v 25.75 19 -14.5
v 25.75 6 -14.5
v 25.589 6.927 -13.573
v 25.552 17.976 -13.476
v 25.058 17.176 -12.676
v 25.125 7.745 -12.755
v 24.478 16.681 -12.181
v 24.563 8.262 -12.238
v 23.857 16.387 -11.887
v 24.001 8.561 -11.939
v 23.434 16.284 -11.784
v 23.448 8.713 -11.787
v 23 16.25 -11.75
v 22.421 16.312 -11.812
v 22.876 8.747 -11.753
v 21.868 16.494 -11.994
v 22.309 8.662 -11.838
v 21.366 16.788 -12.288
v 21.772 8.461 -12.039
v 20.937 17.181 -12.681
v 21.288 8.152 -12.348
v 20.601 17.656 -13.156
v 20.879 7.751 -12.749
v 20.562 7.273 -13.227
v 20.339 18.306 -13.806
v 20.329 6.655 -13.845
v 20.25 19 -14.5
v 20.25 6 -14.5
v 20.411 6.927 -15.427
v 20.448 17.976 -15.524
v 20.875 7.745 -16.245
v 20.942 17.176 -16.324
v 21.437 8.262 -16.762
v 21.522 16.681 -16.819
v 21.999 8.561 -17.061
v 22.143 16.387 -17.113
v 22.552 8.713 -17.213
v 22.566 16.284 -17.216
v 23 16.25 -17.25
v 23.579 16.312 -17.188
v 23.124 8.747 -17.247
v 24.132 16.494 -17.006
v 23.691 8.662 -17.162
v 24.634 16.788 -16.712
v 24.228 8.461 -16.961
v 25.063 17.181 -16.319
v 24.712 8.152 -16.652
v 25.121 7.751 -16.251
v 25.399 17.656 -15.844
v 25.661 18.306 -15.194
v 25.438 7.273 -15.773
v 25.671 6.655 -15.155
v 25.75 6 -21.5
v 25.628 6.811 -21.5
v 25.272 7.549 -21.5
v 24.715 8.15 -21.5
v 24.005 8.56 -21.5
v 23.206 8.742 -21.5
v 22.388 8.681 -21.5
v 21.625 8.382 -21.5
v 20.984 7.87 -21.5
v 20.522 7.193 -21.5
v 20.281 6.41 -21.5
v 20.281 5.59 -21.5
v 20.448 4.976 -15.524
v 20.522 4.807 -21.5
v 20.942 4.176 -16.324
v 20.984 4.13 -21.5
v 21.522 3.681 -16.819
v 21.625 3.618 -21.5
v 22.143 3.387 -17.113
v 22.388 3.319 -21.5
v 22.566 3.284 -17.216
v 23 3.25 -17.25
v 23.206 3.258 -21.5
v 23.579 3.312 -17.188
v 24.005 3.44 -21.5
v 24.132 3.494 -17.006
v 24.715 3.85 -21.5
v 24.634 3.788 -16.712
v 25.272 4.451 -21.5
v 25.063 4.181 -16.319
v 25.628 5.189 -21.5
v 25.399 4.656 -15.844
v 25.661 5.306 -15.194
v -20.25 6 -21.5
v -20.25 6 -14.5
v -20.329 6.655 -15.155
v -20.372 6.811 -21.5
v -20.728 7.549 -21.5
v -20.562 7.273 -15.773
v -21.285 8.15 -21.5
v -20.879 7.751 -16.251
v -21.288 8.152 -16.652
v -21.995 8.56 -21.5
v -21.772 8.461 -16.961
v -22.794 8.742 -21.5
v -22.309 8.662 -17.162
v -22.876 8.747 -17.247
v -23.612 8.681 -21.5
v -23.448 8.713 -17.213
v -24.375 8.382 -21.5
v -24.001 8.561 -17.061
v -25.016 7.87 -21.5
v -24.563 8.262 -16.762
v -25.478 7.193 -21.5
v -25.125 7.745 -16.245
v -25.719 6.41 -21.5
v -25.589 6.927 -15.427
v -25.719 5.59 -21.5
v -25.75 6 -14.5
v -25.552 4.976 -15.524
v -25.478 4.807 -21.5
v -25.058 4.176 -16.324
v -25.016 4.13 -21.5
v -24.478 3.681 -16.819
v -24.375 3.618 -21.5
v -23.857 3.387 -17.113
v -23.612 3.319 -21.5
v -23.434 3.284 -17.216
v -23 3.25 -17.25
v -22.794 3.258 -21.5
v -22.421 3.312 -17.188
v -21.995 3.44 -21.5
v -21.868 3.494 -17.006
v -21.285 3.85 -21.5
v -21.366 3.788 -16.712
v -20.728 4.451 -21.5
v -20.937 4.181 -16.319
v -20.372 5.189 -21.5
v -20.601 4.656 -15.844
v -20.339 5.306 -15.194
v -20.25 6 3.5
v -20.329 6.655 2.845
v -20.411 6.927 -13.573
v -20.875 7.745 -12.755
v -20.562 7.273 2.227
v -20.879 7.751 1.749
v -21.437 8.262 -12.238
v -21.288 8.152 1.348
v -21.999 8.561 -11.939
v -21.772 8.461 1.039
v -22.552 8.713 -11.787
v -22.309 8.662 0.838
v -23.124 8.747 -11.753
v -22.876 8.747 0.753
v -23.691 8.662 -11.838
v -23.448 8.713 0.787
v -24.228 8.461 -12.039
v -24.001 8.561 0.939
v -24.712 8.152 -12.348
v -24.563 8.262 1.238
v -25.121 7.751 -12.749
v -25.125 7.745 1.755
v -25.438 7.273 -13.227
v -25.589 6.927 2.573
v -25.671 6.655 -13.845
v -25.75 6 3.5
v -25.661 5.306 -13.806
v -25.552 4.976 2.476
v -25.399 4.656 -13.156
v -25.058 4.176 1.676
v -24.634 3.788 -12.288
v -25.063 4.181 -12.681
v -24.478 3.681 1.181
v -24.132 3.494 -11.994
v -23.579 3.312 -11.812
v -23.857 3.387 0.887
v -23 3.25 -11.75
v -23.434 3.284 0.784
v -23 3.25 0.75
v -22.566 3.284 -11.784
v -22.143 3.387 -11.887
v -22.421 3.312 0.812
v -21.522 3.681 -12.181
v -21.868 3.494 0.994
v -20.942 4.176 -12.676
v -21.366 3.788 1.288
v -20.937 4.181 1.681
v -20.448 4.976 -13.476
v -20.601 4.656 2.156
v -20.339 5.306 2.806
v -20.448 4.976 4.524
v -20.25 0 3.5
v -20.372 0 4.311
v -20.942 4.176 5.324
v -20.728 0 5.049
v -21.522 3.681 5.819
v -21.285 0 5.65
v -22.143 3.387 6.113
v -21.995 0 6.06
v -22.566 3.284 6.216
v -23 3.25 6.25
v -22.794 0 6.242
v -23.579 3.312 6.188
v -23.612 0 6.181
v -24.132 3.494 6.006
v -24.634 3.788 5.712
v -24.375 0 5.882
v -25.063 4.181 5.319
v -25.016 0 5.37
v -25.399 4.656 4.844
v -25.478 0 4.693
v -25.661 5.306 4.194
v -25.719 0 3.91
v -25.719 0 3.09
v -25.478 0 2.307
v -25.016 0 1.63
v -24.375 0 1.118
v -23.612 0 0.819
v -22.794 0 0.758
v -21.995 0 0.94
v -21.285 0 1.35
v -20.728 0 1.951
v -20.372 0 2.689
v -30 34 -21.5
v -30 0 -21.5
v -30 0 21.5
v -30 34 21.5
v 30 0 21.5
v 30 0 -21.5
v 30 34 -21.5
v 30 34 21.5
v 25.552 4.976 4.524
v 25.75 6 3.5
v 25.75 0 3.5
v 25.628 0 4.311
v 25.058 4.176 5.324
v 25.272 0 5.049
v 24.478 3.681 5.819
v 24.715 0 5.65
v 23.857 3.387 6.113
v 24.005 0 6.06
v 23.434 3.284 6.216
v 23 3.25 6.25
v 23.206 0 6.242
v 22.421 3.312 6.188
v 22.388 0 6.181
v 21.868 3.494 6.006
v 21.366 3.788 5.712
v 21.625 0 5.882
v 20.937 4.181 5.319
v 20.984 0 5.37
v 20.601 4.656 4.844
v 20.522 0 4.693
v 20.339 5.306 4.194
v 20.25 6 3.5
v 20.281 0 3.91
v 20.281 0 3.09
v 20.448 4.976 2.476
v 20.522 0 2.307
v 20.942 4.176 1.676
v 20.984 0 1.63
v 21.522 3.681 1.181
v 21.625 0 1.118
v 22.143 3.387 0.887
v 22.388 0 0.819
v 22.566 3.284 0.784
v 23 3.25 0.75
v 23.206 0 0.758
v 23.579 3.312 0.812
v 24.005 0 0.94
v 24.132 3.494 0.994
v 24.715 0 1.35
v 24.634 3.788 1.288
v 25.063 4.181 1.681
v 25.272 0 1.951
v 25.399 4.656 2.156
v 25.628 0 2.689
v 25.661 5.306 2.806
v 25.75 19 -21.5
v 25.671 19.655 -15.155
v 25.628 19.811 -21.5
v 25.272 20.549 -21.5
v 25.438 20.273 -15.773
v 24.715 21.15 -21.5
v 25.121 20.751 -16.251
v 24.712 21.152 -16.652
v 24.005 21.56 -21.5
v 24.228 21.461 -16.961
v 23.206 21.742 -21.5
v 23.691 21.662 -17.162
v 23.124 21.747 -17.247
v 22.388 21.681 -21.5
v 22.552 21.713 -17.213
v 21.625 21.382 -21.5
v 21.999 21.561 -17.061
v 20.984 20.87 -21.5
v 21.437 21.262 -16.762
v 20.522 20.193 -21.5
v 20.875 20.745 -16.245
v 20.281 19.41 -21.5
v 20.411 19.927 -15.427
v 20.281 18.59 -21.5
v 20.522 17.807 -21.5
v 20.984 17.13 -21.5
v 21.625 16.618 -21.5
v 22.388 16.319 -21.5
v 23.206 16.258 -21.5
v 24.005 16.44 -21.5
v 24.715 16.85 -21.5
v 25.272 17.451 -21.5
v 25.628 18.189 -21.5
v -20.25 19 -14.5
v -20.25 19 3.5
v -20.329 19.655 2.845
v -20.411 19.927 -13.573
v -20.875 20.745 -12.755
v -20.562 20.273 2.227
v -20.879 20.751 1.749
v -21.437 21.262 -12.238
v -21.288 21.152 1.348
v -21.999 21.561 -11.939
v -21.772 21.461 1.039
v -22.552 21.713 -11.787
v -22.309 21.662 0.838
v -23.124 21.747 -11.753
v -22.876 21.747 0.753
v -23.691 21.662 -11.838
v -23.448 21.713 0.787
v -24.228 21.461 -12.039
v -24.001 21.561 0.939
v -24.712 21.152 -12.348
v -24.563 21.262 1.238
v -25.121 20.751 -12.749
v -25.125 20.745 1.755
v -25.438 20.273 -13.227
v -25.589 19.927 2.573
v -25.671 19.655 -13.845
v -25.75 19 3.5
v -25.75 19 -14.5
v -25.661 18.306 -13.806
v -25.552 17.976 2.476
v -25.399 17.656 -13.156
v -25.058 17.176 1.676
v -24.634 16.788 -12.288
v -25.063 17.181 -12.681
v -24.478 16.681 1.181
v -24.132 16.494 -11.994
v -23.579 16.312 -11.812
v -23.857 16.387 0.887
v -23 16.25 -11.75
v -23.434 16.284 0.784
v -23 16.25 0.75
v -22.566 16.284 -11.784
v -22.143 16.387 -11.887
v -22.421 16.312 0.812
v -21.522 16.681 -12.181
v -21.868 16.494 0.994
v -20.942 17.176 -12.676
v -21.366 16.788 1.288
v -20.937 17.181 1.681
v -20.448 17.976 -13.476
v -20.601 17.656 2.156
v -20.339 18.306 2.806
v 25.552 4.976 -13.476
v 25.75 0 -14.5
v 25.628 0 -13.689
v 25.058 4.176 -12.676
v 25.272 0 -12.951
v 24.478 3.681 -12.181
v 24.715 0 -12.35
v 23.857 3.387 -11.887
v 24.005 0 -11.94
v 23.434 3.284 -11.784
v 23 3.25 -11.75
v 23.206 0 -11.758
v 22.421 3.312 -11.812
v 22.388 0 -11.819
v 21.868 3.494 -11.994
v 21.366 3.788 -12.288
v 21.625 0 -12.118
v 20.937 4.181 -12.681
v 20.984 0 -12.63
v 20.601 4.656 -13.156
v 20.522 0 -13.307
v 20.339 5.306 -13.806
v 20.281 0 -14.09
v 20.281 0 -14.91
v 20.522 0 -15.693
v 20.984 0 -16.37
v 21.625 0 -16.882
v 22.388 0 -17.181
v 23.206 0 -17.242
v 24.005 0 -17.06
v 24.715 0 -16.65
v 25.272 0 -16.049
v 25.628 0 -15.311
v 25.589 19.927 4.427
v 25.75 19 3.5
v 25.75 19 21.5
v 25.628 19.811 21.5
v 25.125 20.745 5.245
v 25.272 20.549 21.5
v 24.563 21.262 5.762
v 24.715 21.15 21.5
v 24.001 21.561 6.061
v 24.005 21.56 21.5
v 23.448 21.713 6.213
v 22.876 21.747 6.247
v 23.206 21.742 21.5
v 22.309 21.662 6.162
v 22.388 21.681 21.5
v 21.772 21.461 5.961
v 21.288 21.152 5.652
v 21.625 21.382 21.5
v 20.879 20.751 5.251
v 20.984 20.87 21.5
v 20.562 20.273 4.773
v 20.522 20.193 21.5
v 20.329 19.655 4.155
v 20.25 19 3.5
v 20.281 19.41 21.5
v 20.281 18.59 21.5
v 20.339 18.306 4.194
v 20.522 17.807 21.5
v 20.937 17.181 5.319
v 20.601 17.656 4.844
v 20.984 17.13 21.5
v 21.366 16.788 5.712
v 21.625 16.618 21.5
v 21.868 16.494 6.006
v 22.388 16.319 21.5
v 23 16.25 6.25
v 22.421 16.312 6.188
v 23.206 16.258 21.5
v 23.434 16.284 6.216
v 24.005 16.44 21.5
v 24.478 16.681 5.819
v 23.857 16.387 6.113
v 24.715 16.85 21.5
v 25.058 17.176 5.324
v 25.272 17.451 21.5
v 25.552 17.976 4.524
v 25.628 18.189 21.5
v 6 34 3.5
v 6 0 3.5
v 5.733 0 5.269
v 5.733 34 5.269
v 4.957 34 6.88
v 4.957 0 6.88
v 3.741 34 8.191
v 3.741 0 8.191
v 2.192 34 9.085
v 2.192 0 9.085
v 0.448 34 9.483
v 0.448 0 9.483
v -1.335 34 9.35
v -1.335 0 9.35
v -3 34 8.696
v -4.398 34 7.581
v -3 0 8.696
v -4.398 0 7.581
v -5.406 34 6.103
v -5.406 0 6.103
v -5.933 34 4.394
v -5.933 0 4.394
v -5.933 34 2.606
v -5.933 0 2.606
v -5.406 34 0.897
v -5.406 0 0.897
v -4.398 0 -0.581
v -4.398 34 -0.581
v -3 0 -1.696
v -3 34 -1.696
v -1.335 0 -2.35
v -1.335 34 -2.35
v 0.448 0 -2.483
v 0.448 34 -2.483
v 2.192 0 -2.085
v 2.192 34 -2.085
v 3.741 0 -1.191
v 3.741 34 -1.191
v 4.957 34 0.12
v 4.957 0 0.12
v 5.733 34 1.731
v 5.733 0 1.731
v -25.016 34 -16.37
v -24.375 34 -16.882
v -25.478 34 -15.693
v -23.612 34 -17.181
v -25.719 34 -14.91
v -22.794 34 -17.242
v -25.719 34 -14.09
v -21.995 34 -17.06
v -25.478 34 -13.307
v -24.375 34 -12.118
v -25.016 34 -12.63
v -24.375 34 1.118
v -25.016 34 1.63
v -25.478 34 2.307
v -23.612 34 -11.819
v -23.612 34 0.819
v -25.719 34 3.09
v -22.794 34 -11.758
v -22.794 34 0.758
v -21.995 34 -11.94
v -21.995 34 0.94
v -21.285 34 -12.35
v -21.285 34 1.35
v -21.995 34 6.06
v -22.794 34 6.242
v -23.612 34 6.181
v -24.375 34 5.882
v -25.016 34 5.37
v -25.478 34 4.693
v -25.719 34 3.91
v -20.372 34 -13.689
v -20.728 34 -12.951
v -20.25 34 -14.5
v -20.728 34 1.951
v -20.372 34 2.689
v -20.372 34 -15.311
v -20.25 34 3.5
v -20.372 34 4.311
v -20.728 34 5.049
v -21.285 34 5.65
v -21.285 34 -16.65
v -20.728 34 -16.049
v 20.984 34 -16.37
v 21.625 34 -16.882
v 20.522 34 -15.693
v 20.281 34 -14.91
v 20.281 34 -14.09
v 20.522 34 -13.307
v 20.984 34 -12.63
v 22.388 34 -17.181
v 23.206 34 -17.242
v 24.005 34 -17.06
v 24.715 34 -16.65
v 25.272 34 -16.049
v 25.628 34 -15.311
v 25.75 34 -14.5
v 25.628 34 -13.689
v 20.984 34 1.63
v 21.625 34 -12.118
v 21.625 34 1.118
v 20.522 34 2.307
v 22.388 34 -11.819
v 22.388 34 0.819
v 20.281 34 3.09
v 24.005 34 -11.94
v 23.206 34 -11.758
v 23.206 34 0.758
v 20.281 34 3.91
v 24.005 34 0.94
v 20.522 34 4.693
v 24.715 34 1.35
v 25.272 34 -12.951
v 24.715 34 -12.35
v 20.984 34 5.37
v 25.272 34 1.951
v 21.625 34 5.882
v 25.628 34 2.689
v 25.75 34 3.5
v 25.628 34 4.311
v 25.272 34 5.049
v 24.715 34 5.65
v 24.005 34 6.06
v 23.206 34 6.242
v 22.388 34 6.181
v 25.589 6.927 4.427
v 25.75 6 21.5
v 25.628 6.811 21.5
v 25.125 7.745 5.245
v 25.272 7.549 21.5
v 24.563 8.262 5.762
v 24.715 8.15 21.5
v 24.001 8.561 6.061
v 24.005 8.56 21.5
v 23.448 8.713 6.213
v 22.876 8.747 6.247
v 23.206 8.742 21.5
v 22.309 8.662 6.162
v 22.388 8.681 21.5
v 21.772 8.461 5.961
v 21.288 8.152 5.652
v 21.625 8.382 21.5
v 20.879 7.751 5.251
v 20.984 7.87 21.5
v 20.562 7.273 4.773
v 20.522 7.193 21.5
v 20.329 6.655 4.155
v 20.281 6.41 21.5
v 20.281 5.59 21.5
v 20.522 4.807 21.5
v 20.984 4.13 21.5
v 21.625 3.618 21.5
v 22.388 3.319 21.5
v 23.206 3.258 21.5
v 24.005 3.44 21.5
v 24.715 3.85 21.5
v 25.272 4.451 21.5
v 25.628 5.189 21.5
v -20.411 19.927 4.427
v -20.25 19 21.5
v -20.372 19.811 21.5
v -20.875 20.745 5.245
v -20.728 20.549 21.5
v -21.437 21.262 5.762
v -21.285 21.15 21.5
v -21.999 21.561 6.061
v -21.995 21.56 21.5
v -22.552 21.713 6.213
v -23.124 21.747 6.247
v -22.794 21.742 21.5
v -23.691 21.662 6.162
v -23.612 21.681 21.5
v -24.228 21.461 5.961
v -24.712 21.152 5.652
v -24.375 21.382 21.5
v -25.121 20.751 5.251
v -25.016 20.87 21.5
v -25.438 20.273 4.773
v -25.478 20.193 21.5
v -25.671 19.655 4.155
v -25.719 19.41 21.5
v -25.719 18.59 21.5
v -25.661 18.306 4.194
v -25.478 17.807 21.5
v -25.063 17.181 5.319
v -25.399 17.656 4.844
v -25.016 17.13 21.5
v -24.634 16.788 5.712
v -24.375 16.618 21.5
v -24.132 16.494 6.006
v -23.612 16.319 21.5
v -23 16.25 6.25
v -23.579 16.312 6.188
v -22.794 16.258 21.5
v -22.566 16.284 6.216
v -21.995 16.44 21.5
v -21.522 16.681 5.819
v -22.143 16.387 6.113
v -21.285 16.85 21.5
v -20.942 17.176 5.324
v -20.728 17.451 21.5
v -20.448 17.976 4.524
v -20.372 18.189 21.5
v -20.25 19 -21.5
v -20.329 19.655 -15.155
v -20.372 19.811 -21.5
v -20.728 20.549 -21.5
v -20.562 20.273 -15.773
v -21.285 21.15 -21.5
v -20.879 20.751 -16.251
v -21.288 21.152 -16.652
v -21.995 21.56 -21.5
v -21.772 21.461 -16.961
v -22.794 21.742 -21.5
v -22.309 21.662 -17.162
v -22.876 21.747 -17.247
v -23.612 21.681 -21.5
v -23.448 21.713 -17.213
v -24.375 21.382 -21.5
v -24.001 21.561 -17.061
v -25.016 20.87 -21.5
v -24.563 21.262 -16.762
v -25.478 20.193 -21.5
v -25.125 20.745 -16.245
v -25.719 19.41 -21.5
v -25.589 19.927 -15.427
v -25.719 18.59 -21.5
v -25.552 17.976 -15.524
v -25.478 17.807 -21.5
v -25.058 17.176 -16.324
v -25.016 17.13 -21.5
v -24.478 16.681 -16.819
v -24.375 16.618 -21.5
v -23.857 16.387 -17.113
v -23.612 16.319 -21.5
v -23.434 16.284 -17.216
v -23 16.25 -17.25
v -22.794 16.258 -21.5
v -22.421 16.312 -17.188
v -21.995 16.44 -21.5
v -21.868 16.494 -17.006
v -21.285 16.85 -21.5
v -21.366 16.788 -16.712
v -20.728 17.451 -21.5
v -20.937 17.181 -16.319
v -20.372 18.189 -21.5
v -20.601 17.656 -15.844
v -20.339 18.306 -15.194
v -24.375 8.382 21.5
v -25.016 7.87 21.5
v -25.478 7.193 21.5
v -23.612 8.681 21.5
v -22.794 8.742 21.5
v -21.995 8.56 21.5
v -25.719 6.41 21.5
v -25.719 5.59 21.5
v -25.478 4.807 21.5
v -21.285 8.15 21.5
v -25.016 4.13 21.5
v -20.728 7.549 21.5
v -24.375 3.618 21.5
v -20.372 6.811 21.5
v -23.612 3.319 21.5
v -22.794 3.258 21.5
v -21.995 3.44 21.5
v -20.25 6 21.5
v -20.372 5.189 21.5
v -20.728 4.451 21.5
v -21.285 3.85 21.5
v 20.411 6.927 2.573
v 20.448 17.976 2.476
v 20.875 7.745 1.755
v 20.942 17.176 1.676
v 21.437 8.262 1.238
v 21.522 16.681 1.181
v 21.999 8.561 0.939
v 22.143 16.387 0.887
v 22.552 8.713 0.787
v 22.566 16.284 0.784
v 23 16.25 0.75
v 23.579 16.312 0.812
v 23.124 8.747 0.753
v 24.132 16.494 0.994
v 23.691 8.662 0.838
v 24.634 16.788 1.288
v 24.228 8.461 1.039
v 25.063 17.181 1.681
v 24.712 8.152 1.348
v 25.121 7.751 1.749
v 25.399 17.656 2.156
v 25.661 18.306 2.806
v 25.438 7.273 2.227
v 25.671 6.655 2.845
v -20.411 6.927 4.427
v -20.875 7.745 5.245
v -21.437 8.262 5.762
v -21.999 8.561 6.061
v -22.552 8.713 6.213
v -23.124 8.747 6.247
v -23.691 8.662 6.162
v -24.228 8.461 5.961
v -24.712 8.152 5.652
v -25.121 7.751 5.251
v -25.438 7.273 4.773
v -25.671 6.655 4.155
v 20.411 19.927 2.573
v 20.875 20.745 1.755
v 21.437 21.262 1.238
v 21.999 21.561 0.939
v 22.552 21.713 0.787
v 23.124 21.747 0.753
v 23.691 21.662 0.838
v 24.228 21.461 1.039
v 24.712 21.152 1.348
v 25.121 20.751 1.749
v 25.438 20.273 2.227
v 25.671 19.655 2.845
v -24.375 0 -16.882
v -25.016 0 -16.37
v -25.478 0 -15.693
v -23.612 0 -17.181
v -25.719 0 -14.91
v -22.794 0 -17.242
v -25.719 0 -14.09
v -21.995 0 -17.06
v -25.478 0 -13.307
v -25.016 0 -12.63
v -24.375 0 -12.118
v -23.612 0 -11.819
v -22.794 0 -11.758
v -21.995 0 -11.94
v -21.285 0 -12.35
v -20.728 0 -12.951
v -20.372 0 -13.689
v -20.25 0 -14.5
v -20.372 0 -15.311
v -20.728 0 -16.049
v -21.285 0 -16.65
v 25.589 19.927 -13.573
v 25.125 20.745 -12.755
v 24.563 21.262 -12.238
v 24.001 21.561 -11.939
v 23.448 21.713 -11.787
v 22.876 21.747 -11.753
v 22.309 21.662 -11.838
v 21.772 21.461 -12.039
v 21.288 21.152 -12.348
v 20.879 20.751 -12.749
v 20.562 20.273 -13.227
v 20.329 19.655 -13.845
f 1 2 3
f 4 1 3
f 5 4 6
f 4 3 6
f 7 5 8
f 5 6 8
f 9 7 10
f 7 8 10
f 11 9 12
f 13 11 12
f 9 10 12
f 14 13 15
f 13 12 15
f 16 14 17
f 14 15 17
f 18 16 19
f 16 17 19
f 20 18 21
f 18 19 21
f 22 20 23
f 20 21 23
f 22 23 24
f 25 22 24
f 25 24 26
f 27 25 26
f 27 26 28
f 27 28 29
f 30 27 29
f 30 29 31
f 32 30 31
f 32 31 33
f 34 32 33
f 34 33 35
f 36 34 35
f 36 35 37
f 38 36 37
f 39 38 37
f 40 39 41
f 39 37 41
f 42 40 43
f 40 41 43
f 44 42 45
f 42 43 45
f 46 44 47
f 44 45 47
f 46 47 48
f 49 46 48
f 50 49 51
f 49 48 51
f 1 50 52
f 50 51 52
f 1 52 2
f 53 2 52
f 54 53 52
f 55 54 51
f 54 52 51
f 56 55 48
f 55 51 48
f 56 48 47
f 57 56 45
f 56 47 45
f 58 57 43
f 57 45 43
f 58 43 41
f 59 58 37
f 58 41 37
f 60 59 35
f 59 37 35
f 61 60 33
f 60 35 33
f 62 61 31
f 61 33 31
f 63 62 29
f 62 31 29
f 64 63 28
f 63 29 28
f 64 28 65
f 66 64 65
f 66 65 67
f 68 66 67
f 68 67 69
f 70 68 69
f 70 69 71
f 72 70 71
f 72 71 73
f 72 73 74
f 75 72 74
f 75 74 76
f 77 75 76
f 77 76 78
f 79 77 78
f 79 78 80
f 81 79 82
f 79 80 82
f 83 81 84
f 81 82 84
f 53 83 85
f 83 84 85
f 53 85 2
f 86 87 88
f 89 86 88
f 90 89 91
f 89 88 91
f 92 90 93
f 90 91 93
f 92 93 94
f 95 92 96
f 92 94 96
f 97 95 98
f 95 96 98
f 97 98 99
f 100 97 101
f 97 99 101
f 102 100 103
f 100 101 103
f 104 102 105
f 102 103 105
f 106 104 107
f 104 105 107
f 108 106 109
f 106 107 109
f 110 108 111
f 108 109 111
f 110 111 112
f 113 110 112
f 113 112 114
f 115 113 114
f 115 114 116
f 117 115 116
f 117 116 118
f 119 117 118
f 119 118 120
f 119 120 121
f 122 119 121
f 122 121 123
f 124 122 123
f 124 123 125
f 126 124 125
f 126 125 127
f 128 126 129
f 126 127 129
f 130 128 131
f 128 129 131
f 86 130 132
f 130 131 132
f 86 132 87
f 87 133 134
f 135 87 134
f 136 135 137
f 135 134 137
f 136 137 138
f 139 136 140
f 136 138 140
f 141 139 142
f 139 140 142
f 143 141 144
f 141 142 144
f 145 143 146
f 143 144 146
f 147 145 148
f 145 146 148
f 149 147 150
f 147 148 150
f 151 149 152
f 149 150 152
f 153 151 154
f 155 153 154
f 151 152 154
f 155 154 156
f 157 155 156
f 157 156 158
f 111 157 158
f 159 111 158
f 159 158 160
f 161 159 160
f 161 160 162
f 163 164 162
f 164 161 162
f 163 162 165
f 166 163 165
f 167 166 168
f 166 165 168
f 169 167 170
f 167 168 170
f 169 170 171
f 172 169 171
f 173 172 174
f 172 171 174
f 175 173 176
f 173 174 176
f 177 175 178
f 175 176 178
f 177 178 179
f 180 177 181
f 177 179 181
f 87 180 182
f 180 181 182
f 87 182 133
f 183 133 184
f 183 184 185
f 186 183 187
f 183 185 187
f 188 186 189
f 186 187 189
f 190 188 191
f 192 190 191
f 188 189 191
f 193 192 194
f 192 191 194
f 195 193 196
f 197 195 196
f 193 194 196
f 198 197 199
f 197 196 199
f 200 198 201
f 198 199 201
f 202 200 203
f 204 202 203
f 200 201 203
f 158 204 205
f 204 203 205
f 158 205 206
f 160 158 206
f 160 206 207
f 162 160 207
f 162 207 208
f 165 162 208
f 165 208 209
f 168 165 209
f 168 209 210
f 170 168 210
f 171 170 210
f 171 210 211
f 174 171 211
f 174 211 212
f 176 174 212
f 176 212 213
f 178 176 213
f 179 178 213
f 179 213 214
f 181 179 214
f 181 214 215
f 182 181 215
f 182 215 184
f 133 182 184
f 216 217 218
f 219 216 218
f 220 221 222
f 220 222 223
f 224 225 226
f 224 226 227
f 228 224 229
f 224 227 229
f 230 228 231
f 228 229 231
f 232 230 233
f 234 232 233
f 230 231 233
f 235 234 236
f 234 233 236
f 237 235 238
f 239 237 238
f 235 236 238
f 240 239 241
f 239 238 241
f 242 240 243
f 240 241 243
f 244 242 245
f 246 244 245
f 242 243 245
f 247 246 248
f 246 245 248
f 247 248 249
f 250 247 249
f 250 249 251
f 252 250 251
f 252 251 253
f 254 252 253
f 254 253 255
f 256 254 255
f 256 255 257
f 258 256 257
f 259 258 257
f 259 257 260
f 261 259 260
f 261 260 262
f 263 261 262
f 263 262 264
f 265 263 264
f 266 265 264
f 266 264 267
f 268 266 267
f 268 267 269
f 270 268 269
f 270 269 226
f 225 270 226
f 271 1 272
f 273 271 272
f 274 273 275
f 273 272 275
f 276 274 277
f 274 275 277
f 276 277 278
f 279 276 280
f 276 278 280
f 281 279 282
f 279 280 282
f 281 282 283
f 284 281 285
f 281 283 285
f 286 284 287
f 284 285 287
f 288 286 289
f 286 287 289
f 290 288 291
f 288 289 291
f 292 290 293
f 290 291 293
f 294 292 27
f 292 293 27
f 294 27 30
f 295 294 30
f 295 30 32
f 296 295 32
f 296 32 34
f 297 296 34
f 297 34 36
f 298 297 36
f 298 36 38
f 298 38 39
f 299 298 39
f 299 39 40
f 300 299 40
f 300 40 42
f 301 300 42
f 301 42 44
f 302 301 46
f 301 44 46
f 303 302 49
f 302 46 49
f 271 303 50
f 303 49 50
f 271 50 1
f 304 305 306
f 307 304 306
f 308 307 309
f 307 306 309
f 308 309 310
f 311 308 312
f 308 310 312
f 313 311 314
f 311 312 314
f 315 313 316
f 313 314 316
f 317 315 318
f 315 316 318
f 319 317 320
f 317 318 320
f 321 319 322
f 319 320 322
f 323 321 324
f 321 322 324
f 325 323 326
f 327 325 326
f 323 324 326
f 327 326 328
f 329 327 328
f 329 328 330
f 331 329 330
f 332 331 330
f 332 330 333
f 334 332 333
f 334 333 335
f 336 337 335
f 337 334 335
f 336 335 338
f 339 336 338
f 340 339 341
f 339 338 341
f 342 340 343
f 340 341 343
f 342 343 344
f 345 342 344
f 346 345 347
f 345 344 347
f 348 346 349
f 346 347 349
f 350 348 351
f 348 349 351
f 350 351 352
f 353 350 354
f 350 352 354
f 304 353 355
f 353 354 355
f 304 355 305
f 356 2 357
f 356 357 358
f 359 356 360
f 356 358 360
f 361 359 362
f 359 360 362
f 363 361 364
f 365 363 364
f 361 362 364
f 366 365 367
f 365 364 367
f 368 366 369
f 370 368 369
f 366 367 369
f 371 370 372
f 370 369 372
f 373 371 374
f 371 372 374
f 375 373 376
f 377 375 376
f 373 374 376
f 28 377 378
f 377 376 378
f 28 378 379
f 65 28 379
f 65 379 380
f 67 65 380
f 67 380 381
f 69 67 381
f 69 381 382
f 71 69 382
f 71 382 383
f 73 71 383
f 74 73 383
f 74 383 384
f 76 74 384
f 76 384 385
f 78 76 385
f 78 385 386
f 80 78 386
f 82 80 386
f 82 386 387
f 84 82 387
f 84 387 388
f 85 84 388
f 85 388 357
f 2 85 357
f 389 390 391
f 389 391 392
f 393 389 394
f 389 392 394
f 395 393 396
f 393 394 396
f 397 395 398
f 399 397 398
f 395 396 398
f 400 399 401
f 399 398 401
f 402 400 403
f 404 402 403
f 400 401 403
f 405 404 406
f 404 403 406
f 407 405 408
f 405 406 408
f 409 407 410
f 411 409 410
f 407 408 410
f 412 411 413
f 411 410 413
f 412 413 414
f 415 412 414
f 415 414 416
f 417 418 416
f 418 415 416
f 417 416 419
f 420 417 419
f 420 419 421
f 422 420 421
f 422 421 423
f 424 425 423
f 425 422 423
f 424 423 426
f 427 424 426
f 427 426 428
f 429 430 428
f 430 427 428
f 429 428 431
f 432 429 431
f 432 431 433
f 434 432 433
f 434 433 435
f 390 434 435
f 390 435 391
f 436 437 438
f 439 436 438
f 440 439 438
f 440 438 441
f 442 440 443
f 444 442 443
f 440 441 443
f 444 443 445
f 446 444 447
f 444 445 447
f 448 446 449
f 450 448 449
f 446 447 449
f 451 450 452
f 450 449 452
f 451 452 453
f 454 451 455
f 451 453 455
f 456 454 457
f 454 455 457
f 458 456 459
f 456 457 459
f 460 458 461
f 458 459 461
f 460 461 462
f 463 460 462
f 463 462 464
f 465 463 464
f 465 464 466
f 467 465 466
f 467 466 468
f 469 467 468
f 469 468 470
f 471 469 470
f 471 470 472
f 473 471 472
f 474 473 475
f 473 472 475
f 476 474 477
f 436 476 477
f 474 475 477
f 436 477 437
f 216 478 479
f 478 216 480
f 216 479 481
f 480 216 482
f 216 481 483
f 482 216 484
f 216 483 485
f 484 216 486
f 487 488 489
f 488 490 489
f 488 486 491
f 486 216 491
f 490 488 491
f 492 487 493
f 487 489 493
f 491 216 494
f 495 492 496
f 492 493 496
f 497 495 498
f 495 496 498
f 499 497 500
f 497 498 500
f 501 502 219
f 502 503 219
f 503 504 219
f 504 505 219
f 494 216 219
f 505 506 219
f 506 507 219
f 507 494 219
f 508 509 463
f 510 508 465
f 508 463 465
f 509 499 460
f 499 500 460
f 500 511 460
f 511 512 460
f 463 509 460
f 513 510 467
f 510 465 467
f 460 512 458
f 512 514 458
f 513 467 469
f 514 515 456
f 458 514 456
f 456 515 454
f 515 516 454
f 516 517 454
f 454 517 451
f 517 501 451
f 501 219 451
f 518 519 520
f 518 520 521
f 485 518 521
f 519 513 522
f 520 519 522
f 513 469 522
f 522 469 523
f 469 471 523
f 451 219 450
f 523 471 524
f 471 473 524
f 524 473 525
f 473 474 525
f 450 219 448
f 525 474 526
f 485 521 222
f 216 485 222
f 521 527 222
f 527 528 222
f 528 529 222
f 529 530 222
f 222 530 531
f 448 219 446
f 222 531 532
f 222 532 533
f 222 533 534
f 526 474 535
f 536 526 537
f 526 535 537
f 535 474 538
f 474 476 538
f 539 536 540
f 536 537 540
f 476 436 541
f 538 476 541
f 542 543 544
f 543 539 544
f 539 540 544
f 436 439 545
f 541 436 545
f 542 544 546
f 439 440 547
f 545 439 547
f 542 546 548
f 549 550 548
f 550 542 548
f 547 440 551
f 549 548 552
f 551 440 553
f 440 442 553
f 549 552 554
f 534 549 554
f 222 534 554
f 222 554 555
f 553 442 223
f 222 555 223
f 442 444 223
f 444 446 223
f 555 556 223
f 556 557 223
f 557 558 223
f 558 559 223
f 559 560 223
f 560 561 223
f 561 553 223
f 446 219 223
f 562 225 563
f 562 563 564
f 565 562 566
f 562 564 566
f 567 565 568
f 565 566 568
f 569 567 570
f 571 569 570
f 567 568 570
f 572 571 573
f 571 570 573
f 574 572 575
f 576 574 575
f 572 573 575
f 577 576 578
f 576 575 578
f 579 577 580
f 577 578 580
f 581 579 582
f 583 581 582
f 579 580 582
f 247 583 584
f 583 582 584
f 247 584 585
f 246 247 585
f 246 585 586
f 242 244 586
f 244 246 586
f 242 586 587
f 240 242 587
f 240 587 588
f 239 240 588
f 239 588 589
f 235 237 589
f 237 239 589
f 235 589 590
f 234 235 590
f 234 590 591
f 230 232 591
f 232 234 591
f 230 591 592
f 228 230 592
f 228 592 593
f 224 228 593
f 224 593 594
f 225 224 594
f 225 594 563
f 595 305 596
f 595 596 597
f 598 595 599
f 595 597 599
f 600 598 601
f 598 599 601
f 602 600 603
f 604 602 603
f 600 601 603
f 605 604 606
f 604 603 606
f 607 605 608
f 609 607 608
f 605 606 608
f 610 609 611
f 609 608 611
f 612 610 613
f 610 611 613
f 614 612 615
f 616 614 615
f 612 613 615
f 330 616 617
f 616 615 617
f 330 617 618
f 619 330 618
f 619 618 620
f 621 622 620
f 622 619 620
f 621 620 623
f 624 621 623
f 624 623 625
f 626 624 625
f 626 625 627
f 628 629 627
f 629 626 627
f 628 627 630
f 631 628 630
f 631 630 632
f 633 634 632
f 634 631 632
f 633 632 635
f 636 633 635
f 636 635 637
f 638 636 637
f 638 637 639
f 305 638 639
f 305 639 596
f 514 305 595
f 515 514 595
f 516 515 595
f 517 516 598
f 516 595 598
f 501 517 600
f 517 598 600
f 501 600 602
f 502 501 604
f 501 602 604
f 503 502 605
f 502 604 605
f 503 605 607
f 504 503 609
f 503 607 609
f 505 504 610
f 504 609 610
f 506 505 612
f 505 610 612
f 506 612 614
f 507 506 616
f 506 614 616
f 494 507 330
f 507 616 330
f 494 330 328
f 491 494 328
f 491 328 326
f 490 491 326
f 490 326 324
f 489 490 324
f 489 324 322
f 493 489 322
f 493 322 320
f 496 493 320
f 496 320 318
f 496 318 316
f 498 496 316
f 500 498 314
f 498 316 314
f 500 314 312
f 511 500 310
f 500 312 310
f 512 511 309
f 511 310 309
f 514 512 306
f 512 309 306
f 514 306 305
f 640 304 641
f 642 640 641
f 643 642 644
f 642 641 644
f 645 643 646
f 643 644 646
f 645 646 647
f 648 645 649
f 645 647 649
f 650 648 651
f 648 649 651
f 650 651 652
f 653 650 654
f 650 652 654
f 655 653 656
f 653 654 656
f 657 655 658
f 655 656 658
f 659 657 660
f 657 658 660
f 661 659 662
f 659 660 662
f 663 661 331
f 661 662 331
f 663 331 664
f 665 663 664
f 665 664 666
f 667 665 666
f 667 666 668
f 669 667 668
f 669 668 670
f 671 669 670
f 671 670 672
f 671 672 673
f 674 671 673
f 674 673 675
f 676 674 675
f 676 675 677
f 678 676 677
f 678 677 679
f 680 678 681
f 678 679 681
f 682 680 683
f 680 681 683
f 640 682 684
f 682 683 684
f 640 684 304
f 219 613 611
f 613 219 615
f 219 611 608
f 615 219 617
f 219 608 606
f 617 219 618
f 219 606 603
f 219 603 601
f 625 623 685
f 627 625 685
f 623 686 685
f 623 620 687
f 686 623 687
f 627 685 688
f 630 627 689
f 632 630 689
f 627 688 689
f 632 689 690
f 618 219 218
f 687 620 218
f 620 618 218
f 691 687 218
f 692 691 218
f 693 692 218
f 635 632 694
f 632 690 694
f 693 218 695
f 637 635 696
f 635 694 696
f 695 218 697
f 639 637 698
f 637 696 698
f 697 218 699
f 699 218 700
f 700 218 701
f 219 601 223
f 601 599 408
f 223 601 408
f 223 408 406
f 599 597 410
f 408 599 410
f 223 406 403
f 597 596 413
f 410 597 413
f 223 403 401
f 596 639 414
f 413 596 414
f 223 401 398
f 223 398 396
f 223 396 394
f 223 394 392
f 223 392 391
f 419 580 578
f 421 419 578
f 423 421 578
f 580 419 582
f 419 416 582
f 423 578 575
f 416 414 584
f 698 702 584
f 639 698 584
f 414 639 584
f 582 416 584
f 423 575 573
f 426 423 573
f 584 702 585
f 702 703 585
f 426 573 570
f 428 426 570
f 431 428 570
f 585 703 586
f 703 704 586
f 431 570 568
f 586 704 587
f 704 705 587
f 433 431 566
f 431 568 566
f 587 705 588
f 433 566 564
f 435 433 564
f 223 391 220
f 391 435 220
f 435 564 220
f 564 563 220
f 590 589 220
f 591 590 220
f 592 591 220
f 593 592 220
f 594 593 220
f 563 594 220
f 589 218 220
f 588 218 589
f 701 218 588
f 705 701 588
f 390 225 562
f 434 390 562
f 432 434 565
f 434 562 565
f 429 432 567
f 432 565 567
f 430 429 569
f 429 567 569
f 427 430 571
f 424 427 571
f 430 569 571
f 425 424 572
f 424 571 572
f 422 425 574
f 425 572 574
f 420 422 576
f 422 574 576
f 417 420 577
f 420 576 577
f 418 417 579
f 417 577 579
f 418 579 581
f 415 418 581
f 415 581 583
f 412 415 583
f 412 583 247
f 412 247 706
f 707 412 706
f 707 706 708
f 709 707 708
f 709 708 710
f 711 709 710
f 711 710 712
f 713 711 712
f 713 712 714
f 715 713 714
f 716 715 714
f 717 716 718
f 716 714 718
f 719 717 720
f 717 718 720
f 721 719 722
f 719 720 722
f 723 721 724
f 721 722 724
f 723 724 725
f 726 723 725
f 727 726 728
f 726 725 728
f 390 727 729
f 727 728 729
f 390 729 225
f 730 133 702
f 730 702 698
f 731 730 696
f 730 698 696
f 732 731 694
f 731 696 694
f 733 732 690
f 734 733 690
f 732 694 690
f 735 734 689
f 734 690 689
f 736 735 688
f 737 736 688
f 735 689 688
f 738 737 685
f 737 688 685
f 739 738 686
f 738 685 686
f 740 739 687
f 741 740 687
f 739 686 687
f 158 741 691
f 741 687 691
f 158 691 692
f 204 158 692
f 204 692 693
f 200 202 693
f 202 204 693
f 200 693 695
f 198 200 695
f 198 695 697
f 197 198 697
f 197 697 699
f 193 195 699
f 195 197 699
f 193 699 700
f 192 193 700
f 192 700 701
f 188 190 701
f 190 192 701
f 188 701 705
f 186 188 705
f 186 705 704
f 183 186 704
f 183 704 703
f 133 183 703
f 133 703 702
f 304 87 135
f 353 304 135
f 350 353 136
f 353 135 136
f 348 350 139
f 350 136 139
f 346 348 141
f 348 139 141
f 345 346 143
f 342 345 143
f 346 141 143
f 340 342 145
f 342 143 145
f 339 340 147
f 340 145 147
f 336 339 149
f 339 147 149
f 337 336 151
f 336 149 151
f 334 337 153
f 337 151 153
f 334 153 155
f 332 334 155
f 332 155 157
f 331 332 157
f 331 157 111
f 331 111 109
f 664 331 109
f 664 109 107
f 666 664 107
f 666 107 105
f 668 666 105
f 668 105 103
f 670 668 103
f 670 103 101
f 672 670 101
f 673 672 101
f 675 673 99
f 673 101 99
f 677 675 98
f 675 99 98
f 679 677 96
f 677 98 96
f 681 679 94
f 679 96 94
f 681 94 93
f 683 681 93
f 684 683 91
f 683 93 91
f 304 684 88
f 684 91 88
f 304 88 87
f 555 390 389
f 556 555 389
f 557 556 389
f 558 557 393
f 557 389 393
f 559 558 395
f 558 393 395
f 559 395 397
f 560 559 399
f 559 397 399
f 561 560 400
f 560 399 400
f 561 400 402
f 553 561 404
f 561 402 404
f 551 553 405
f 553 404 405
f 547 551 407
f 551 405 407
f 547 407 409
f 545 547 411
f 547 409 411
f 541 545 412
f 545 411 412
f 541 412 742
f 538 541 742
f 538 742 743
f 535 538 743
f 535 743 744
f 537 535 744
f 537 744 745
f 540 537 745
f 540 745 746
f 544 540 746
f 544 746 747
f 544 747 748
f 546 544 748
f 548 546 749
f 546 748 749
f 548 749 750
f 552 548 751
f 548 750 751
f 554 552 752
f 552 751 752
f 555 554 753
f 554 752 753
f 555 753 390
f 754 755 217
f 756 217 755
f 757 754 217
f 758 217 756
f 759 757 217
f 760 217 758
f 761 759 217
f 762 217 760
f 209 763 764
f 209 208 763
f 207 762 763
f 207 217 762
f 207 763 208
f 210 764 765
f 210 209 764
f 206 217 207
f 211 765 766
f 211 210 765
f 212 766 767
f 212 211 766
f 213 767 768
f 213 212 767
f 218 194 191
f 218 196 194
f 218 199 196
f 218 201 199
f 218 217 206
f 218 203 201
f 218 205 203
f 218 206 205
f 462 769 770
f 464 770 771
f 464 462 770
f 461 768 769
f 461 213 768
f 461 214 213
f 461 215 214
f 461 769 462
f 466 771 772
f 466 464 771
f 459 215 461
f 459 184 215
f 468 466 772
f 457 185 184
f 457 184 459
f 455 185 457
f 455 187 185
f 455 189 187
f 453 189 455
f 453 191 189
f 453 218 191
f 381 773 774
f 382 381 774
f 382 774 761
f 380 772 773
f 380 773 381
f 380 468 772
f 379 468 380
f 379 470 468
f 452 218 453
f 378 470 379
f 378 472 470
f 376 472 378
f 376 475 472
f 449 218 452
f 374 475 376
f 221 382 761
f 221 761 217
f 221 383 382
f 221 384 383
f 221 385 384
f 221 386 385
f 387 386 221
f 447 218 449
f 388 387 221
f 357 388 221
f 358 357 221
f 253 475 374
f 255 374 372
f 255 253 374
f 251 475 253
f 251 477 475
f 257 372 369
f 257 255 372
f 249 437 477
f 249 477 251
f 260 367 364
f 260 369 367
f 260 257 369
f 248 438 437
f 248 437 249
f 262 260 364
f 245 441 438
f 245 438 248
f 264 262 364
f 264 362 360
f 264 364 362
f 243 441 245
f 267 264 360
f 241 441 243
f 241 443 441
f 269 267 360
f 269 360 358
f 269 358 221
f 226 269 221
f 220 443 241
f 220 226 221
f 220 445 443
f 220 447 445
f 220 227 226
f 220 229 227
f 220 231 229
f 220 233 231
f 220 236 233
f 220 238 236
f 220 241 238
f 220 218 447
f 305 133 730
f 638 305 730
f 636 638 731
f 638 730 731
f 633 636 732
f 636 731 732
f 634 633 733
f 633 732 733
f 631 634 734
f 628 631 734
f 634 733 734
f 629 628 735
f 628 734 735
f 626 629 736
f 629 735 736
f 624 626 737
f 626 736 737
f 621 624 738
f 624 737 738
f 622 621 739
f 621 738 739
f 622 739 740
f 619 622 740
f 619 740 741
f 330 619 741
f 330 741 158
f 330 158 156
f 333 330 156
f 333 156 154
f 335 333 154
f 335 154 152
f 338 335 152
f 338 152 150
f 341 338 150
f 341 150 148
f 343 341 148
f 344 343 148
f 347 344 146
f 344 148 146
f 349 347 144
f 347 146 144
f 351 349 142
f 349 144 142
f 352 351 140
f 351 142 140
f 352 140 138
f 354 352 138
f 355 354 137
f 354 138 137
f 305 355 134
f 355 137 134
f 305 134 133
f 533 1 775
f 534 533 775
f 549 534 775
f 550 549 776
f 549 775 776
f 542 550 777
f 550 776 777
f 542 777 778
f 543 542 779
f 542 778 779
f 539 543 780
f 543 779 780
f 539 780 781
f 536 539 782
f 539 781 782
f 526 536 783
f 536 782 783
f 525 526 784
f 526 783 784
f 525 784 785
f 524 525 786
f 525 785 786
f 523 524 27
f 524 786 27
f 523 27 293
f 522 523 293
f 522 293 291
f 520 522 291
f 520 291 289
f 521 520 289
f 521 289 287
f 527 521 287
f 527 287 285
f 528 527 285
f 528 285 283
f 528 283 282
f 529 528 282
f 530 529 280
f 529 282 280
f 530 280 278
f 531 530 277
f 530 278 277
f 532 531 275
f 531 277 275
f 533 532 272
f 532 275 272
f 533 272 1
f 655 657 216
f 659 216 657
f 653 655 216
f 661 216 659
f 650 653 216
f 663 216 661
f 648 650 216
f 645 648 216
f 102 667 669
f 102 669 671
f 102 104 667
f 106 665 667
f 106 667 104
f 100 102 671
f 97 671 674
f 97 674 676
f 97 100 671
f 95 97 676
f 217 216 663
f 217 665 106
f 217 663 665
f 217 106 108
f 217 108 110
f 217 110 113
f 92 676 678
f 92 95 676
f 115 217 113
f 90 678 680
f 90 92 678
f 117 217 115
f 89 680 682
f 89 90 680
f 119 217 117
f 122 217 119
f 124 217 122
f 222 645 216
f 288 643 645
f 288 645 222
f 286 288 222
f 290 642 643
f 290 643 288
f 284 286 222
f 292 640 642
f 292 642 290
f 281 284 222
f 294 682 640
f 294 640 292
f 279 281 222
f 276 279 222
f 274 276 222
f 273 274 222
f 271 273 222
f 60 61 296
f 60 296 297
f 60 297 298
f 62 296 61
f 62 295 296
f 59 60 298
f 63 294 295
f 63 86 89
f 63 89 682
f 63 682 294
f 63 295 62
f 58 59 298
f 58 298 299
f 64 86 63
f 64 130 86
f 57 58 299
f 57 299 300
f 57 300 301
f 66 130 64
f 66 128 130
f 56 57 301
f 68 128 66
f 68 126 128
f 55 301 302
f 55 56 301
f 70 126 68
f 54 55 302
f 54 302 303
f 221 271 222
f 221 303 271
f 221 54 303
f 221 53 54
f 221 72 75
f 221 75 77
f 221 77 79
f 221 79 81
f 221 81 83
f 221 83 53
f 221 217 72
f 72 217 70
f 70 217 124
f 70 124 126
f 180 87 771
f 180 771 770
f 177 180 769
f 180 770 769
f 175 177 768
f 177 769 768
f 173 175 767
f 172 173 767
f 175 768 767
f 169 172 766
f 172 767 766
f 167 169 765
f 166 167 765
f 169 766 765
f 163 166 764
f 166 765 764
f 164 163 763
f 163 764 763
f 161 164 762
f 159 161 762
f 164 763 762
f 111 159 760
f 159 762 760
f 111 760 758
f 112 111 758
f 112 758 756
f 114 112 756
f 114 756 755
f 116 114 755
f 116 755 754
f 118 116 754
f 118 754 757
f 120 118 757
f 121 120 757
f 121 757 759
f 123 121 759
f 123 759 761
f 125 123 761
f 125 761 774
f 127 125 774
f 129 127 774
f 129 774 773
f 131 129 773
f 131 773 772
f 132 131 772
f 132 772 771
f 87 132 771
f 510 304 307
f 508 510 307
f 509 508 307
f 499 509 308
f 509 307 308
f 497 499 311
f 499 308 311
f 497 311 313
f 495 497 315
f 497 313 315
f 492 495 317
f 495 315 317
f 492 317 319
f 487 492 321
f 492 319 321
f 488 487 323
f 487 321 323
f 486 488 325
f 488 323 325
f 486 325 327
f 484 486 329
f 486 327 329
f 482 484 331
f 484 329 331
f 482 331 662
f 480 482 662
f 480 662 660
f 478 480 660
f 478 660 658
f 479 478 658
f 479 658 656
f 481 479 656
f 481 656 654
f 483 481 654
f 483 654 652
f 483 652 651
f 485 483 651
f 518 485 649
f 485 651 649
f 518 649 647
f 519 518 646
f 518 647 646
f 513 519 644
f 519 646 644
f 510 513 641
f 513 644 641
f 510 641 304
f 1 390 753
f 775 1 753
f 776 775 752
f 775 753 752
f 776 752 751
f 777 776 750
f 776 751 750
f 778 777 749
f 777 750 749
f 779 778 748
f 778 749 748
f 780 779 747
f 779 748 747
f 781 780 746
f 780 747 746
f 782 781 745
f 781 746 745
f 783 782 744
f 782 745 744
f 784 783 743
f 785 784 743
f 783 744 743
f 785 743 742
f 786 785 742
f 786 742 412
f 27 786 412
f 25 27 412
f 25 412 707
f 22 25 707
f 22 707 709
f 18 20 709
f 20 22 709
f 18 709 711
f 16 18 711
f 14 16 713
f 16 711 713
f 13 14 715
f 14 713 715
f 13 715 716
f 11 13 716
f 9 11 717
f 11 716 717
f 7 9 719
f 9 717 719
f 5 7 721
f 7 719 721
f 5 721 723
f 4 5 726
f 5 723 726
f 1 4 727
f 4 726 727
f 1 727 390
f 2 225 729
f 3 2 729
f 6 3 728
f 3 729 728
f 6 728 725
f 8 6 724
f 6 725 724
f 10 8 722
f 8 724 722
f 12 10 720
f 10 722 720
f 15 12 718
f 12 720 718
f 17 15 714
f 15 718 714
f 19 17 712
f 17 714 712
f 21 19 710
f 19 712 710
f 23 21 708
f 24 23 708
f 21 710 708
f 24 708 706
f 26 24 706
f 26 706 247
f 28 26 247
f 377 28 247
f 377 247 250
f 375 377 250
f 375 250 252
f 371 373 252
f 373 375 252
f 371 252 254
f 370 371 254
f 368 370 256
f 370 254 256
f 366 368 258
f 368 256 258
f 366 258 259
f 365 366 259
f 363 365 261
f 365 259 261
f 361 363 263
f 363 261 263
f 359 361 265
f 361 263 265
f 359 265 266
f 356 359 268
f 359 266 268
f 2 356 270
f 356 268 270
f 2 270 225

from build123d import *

# Parameters (mm, degrees)
F0_W     = 60
F0_H     = 43
F0_R     = 6
F1_DEPTH = 34
F2_R     = 2.75
F3_DEPTH = 34.001
F4_R     = 2.75
F5_DEPTH = 43.001


with BuildPart() as f1:
    # F0 (on Front) → F1 (new body)
    with BuildSketch(Plane.XZ):
        Rectangle(F0_W, F0_H)
        with Locations((0, 3.5)):
            Circle(F0_R, mode=Mode.SUBTRACT)
    extrude(amount=-F1_DEPTH)

    # F2 (on face) → F3 (cut, through all)
    with BuildSketch(Plane.XZ):
        with Locations((23, 3.5)):
            Circle(F2_R)
        with Locations((-23, -14.5)):
            Circle(F2_R)
        with Locations((23, -14.5)):
            Circle(F2_R)
        with Locations((-23, 3.5)):
            Circle(F2_R)
    extrude(amount=-F3_DEPTH, mode=Mode.SUBTRACT)

    # F4 (on face) → F5 (cut, through all)
    with BuildSketch(Plane.XY.offset(21.5)):
        with Locations((-23, 19)):
            Circle(F4_R)
        with Locations((-23, 6)):
            Circle(F4_R)
        with Locations((23, 6)):
            Circle(F4_R)
        with Locations((23, 19)):
            Circle(F4_R)
    extrude(amount=-F5_DEPTH, mode=Mode.SUBTRACT)


solid = f1.part
